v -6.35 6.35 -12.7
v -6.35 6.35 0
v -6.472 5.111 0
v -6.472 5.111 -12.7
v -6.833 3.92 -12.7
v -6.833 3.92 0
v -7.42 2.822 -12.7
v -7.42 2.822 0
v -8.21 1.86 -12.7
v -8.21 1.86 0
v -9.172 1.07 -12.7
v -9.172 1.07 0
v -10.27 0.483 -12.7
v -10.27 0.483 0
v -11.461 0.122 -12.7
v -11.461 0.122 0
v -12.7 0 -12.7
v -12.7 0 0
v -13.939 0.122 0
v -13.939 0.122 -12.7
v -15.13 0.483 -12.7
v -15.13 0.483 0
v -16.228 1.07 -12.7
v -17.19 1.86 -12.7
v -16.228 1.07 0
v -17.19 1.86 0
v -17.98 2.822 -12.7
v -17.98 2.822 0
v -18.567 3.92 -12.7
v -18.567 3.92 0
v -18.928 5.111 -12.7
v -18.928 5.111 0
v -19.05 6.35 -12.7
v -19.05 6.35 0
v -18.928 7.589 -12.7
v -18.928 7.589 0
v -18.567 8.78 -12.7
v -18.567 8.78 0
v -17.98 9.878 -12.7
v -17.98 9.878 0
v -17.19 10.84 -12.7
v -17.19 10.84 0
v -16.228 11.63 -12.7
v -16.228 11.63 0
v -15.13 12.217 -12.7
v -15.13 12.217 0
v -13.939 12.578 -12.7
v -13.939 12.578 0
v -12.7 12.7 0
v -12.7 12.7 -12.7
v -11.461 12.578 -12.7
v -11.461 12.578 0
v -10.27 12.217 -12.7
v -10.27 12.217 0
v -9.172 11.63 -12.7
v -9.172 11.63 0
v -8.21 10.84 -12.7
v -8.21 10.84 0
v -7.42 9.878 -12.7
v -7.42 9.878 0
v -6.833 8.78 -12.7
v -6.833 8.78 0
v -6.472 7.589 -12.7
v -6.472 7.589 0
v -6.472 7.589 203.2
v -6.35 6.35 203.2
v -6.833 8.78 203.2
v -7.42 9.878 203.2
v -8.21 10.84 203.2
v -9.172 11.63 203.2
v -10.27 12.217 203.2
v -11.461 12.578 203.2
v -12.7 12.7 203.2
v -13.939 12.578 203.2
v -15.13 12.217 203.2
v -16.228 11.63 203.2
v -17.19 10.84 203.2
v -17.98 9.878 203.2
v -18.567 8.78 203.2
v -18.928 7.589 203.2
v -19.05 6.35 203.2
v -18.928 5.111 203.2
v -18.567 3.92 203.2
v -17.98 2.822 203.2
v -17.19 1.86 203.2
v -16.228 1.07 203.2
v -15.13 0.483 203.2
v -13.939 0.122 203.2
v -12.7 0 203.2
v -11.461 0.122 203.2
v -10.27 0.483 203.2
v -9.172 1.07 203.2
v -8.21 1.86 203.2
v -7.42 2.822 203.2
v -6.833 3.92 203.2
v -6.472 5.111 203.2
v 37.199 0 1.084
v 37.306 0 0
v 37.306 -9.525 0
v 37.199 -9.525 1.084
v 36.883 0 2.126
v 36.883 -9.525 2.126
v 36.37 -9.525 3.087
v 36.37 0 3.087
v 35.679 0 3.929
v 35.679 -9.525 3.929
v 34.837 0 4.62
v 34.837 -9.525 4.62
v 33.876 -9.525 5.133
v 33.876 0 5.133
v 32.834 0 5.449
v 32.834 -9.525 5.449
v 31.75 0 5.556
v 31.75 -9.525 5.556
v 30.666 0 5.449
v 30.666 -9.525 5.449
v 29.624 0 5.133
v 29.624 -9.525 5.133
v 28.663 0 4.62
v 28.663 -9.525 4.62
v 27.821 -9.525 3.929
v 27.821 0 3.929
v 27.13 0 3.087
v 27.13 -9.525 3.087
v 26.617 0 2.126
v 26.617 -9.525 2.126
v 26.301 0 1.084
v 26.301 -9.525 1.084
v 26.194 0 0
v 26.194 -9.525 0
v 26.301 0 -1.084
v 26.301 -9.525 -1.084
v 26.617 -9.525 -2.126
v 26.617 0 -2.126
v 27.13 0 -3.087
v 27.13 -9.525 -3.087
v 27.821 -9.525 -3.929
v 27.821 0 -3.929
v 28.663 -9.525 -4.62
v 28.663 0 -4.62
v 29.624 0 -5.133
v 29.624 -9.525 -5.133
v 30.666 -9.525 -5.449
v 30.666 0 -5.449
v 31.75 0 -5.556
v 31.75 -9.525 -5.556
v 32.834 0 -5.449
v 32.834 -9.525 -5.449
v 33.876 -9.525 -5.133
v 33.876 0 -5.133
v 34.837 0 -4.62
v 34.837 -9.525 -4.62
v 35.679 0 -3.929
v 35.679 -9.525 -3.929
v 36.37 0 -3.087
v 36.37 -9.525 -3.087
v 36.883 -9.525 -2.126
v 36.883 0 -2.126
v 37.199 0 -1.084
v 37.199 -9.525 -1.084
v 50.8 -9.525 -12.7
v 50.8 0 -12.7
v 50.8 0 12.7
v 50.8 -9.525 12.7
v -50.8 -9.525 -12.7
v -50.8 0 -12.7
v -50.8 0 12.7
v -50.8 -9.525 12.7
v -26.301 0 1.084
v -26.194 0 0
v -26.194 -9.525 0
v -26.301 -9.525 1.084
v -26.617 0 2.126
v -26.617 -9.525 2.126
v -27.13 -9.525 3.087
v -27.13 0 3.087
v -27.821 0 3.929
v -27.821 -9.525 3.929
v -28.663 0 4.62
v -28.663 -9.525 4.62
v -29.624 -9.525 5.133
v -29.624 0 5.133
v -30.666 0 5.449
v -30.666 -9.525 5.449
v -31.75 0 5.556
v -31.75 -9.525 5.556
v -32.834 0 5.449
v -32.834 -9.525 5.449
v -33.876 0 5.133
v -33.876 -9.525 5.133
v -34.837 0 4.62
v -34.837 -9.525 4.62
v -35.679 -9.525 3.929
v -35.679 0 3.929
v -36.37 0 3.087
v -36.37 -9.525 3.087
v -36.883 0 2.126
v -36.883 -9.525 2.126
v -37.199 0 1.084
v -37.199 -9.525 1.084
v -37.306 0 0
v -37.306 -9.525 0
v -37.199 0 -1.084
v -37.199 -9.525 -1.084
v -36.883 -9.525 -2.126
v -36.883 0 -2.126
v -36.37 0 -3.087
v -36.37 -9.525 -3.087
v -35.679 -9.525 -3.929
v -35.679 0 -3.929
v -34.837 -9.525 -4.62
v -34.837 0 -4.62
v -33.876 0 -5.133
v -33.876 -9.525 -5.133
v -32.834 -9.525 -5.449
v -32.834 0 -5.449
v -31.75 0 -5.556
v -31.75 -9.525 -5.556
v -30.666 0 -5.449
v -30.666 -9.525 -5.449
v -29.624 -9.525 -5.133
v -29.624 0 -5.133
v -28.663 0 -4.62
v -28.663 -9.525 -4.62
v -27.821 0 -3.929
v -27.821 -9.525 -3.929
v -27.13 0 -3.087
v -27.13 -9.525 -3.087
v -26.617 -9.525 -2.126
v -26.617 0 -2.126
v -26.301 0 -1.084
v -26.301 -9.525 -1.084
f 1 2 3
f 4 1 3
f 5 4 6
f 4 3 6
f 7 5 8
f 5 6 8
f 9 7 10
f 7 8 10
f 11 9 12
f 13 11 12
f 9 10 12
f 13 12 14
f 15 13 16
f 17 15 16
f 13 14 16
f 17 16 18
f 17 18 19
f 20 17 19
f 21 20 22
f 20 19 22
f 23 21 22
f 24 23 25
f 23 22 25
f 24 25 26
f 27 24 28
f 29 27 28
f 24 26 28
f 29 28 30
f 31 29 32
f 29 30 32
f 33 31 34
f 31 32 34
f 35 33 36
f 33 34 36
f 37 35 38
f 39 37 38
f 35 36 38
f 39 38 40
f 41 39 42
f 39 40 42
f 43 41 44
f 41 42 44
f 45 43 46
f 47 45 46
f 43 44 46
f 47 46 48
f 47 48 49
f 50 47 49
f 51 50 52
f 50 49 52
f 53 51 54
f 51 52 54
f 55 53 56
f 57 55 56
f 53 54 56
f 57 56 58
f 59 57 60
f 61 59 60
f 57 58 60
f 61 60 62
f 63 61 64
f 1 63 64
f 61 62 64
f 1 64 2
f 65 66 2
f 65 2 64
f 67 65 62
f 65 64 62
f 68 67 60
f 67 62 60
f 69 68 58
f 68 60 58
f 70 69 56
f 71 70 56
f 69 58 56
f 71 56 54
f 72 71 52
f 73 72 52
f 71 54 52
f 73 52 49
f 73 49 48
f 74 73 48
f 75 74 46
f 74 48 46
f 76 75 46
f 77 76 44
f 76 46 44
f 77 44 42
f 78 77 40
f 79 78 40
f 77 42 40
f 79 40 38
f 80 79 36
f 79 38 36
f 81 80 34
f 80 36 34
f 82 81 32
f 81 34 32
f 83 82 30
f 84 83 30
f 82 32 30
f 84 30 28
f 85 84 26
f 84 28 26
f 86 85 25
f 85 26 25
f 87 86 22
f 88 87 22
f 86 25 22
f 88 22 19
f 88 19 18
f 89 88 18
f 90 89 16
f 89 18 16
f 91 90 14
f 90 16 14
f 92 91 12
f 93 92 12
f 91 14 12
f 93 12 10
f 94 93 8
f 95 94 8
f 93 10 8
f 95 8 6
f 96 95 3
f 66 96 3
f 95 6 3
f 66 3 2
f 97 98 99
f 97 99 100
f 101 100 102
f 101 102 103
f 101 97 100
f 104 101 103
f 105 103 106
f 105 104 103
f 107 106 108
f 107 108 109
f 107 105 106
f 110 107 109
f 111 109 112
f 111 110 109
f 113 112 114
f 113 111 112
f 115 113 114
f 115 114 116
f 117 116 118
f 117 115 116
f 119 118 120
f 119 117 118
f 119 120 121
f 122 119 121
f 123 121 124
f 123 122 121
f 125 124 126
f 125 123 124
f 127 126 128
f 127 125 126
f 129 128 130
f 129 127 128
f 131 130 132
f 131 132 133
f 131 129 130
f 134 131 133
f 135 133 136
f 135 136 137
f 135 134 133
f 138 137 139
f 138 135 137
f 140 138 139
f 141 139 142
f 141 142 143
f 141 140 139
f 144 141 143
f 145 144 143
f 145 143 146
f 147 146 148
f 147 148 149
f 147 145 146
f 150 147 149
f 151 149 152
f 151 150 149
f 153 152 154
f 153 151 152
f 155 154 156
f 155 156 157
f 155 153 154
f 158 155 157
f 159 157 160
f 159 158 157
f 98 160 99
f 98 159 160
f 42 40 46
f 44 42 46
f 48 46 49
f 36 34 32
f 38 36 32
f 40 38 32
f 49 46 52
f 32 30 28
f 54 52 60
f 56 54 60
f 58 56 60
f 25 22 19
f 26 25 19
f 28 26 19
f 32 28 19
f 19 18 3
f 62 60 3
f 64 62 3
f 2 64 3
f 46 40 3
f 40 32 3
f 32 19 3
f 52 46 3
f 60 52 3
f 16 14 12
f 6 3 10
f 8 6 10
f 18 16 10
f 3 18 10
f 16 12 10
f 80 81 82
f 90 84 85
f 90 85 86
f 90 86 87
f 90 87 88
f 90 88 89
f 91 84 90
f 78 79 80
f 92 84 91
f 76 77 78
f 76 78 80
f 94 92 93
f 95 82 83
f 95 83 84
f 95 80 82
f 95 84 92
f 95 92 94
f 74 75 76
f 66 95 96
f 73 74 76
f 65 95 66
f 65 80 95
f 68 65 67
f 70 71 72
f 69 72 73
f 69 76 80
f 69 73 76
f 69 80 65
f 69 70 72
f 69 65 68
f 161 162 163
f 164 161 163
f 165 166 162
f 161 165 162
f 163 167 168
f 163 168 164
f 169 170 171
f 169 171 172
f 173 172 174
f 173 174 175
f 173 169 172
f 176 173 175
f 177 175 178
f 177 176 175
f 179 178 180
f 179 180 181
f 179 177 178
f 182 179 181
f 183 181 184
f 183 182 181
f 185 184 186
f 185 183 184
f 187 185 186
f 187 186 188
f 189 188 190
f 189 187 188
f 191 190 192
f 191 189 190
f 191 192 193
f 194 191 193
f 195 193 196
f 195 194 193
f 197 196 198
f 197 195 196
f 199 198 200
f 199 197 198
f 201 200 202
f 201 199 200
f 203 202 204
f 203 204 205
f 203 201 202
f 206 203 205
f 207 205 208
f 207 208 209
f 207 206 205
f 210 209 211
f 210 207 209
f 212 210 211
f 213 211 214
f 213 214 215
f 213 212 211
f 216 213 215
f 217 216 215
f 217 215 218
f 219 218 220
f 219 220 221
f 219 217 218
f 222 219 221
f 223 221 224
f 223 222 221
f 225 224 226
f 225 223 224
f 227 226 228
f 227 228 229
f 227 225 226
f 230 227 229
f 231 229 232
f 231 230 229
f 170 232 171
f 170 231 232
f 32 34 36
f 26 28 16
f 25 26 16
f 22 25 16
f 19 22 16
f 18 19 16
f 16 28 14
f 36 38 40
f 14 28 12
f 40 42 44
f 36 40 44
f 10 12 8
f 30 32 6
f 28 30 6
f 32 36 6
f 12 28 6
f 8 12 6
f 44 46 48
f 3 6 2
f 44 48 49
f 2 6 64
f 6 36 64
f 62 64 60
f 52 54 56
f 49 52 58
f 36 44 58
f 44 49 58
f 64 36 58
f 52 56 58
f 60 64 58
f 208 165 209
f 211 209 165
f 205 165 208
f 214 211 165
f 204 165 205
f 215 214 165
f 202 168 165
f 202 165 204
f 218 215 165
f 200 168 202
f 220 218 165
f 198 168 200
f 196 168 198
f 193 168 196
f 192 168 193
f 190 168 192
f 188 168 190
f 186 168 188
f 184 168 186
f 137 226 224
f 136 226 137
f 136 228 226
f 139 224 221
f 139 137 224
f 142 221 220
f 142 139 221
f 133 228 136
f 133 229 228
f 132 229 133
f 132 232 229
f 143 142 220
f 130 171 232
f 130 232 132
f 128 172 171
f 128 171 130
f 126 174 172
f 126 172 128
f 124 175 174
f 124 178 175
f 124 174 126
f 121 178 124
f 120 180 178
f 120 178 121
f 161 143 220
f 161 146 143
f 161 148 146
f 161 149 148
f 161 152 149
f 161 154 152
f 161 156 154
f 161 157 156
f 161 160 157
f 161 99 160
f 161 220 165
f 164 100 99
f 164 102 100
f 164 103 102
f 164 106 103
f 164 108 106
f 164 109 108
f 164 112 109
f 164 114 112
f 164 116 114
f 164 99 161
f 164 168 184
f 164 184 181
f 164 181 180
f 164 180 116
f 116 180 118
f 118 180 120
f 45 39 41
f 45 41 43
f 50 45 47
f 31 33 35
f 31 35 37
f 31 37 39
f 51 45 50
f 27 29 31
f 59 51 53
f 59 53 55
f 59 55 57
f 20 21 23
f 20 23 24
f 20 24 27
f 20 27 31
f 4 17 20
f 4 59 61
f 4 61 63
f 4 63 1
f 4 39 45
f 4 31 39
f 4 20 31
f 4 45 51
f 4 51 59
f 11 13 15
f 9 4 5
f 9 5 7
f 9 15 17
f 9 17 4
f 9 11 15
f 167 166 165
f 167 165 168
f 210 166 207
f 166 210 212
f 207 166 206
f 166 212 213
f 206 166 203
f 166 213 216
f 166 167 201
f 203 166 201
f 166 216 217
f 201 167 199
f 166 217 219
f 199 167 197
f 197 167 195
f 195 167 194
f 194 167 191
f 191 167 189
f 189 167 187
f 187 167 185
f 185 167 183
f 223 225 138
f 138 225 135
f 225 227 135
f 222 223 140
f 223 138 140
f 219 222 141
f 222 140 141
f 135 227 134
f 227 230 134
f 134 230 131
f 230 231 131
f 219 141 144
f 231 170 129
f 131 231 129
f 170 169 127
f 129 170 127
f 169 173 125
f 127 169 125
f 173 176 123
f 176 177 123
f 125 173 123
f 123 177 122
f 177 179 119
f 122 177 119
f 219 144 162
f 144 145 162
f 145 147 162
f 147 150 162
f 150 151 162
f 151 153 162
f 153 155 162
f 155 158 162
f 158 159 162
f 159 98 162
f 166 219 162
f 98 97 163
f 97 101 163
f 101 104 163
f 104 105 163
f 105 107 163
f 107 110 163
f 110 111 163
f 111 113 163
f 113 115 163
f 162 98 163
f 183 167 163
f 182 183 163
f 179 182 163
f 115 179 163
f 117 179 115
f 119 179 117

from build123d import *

# Parameters (mm, degrees)
F0_W      = 101.6
F0_H      = 25.4
F0_R      = 5.55625
F1_DEPTH  = 9.525
F2_R      = 6.35
F3_DEPTH  = 203.2
F3_FACE_R = 6.35
F4_DEPTH  = 12.7


with BuildPart() as f1:
    # F0 (on Front) → F1 (new body)
    with BuildSketch(Plane.XZ):
        Rectangle(F0_W, F0_H)
        with Locations((-31.75, 0)):
            Circle(F0_R, mode=Mode.SUBTRACT)
        with Locations((31.75, 0)):
            Circle(F0_R, mode=Mode.SUBTRACT)
    extrude(amount=F1_DEPTH)


with BuildPart() as f3:
    # F2 (on Top) → F3 (new body)
    with BuildSketch(Plane.XY):
        with Locations((-12.7, 6.35)):
            Circle(F2_R)
    extrude(amount=F3_DEPTH)


with BuildPart() as f4:
    # F3_face (on face) → F4 (new body)
    with BuildSketch(Plane(origin=(-12.7, 6.35, 0), x_dir=(1, 0, 0), z_dir=(0, 0, -1))):
        Circle(F3_FACE_R)
    extrude(amount=F4_DEPTH)


solid = Compound([f1.part, f3.part, f4.part])
